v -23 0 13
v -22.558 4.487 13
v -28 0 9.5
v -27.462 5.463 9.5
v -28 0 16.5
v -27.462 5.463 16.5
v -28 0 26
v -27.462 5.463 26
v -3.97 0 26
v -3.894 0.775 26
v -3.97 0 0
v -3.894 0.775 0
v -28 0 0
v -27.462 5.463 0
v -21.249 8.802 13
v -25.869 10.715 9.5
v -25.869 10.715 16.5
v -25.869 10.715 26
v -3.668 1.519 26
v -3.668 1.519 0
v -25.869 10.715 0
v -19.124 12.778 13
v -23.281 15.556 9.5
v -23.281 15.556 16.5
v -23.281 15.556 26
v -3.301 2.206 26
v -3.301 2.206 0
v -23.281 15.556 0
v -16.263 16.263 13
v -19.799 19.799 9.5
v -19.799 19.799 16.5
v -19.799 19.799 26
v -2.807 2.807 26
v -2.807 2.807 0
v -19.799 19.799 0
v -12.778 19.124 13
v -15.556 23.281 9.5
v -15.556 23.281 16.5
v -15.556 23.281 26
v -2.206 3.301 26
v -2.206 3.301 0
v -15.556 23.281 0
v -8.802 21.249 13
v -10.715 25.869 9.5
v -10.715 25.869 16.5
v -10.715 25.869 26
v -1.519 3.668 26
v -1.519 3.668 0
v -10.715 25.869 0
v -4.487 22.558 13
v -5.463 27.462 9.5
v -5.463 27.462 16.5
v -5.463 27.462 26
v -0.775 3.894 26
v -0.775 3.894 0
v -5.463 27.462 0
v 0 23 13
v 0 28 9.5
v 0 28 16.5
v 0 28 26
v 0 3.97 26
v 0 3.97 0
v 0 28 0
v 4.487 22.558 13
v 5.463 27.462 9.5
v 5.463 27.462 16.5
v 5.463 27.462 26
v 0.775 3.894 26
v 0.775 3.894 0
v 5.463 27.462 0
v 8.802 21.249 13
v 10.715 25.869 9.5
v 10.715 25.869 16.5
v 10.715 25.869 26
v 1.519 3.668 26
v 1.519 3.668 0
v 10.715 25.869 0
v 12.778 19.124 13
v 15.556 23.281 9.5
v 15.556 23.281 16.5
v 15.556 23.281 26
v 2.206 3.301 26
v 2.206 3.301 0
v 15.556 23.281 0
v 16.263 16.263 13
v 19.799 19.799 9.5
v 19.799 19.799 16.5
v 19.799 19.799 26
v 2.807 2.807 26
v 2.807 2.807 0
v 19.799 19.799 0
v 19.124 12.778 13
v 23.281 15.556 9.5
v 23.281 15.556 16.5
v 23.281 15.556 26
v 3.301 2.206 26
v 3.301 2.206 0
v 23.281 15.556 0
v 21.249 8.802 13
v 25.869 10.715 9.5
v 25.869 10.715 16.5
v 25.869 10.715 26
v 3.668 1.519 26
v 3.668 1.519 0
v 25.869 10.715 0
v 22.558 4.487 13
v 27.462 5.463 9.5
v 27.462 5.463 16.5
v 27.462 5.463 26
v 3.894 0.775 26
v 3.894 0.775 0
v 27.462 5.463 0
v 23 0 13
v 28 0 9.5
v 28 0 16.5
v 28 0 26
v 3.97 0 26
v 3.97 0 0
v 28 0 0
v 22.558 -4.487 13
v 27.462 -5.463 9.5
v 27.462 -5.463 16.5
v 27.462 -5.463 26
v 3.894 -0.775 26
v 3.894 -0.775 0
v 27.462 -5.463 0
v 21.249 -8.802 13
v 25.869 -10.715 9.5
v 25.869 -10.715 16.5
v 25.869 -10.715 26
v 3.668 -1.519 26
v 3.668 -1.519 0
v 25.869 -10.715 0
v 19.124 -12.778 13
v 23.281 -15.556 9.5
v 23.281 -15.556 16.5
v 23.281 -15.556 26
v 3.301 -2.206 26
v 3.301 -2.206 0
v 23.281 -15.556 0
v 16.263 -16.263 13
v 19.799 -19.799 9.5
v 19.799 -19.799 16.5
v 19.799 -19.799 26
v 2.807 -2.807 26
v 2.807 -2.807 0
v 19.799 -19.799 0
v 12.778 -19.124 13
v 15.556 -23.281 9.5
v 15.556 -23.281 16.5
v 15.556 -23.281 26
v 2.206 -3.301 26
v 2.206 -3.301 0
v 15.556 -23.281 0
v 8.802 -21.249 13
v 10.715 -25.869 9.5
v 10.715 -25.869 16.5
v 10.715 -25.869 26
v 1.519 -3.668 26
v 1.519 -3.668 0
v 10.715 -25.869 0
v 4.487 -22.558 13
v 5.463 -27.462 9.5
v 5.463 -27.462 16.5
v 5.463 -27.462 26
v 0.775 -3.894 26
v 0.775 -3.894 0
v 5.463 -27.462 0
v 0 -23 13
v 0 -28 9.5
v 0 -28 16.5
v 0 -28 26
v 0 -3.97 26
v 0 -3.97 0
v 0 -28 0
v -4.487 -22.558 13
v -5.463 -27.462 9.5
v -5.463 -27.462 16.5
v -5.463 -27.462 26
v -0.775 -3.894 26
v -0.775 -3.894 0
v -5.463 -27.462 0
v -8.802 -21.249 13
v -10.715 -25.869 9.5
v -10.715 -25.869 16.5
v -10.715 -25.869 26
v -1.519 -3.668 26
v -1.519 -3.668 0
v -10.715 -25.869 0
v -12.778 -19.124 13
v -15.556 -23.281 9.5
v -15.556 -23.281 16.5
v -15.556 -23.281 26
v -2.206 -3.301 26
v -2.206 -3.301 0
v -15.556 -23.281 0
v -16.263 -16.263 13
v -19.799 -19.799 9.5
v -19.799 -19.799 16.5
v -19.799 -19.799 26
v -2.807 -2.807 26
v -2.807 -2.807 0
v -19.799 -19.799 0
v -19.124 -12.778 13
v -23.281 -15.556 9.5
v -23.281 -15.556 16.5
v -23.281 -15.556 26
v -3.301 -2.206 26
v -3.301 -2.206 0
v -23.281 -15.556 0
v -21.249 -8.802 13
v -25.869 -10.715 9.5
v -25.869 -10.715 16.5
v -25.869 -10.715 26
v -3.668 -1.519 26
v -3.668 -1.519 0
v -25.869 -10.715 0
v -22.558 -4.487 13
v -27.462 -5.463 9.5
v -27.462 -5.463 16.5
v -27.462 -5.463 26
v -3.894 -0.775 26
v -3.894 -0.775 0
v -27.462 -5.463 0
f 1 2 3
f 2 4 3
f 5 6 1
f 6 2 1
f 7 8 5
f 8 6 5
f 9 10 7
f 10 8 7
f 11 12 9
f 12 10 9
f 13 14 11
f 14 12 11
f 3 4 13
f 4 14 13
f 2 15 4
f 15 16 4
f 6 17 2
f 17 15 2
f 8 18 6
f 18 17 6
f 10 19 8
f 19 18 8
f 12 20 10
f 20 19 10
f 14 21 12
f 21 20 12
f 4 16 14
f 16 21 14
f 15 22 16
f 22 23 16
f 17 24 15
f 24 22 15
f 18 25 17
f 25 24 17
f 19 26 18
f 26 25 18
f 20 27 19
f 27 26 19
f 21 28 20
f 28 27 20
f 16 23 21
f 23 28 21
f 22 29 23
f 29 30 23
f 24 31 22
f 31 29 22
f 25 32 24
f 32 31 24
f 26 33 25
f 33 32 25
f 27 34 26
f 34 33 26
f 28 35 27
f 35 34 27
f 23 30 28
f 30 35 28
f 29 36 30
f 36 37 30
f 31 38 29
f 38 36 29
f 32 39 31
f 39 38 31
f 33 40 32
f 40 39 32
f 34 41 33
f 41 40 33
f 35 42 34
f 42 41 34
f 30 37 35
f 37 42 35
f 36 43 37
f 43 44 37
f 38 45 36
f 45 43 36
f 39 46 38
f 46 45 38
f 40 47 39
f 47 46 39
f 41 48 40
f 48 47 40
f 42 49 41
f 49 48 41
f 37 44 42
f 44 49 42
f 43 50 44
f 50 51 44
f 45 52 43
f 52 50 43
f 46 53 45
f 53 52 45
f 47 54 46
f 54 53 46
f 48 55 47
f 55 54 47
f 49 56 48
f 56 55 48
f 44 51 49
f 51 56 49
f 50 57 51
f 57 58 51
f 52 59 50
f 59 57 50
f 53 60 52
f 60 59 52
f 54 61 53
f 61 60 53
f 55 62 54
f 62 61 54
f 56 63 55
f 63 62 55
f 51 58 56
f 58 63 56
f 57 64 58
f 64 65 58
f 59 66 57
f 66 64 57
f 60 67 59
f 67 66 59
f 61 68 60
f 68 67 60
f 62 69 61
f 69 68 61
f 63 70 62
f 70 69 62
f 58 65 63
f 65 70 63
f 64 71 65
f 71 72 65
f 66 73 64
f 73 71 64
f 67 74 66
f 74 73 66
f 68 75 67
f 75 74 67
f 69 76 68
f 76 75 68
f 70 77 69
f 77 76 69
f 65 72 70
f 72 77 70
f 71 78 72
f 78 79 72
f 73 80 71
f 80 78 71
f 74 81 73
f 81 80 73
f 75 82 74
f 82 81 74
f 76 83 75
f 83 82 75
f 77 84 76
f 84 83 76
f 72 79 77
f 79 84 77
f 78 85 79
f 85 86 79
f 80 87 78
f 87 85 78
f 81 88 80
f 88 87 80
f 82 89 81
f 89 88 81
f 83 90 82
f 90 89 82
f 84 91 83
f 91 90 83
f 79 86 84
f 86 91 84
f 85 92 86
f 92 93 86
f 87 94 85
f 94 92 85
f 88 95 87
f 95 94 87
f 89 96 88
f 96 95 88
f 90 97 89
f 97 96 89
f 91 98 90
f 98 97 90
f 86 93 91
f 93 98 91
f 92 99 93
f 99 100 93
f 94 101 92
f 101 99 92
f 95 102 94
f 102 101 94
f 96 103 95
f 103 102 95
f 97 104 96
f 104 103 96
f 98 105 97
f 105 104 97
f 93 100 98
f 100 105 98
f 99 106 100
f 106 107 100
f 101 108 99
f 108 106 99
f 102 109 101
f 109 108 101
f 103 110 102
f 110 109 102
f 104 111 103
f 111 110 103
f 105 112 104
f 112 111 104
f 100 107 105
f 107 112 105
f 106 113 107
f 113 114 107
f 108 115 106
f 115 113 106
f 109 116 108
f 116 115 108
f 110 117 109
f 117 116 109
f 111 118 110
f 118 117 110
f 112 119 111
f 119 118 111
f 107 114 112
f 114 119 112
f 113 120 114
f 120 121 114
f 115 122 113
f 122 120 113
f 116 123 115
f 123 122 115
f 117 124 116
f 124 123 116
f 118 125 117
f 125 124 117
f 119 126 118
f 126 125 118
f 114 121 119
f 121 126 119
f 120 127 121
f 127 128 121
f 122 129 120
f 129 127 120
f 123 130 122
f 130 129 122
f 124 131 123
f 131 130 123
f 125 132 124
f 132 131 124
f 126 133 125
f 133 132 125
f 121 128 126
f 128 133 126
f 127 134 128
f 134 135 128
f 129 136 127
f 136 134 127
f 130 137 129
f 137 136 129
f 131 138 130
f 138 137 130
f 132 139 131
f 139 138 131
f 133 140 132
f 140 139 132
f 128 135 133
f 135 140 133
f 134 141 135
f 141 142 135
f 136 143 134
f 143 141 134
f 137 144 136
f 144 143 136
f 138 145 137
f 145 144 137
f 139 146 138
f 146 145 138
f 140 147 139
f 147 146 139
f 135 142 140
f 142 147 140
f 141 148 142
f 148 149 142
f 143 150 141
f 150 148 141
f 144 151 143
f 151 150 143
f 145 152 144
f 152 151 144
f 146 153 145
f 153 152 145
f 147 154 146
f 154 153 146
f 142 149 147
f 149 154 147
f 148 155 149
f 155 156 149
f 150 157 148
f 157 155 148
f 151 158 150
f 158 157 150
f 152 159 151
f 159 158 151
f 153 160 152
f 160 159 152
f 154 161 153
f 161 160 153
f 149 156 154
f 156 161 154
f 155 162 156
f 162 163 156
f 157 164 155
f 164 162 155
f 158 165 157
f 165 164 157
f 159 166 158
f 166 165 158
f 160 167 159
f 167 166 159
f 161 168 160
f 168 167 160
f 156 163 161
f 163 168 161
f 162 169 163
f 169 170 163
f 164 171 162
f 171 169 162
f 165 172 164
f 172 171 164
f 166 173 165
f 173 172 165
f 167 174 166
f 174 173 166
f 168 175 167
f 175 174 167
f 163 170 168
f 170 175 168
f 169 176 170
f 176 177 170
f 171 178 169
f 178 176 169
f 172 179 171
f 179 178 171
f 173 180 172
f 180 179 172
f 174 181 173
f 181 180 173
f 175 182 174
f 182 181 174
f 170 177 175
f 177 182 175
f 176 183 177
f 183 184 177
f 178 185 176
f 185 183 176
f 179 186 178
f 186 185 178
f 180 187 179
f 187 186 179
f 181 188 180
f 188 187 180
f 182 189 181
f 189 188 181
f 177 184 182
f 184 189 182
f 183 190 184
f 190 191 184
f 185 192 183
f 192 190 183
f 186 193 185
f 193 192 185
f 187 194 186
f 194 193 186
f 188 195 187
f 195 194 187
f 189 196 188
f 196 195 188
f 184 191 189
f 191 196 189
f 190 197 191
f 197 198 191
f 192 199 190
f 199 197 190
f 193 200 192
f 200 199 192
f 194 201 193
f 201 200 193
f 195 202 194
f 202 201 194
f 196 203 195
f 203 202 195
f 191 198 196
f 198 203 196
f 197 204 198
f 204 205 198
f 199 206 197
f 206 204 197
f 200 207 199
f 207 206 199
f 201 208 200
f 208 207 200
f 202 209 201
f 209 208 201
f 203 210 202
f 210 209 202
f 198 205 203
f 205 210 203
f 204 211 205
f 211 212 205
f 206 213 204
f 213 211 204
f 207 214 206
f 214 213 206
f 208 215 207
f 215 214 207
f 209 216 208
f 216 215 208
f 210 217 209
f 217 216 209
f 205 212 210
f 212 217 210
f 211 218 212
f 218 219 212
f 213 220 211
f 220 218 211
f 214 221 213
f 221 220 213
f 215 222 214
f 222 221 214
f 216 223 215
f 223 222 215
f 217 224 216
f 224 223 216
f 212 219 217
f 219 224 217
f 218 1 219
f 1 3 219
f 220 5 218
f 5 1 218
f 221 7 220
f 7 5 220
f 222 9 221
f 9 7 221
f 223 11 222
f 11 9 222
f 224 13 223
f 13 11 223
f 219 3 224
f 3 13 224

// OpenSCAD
$fn = 32;

// ----------------------------------------------------------------------
// Belt roller: 56 mm barrel, 26 mm wide, bore 7.94 mm
// ----------------------------------------------------------------------

// --- parameters (mm) ---
bore_d = 7.94;            // bore
barrel_d = 56;            // barrel diameter
roller_w = 26;            // roller width
groove_w = 7;             // guide groove width
groove_d = 5;             // guide groove depth

roller_profile = [[3.97, 0], [28, 0], [28, 9.5], [23, 13], [28, 16.5], [28, 26], [3.97, 26]];

/* the profile stays clear of the axis, so the bore comes out of the revolve */
rotate_extrude() polygon(roller_profile);
